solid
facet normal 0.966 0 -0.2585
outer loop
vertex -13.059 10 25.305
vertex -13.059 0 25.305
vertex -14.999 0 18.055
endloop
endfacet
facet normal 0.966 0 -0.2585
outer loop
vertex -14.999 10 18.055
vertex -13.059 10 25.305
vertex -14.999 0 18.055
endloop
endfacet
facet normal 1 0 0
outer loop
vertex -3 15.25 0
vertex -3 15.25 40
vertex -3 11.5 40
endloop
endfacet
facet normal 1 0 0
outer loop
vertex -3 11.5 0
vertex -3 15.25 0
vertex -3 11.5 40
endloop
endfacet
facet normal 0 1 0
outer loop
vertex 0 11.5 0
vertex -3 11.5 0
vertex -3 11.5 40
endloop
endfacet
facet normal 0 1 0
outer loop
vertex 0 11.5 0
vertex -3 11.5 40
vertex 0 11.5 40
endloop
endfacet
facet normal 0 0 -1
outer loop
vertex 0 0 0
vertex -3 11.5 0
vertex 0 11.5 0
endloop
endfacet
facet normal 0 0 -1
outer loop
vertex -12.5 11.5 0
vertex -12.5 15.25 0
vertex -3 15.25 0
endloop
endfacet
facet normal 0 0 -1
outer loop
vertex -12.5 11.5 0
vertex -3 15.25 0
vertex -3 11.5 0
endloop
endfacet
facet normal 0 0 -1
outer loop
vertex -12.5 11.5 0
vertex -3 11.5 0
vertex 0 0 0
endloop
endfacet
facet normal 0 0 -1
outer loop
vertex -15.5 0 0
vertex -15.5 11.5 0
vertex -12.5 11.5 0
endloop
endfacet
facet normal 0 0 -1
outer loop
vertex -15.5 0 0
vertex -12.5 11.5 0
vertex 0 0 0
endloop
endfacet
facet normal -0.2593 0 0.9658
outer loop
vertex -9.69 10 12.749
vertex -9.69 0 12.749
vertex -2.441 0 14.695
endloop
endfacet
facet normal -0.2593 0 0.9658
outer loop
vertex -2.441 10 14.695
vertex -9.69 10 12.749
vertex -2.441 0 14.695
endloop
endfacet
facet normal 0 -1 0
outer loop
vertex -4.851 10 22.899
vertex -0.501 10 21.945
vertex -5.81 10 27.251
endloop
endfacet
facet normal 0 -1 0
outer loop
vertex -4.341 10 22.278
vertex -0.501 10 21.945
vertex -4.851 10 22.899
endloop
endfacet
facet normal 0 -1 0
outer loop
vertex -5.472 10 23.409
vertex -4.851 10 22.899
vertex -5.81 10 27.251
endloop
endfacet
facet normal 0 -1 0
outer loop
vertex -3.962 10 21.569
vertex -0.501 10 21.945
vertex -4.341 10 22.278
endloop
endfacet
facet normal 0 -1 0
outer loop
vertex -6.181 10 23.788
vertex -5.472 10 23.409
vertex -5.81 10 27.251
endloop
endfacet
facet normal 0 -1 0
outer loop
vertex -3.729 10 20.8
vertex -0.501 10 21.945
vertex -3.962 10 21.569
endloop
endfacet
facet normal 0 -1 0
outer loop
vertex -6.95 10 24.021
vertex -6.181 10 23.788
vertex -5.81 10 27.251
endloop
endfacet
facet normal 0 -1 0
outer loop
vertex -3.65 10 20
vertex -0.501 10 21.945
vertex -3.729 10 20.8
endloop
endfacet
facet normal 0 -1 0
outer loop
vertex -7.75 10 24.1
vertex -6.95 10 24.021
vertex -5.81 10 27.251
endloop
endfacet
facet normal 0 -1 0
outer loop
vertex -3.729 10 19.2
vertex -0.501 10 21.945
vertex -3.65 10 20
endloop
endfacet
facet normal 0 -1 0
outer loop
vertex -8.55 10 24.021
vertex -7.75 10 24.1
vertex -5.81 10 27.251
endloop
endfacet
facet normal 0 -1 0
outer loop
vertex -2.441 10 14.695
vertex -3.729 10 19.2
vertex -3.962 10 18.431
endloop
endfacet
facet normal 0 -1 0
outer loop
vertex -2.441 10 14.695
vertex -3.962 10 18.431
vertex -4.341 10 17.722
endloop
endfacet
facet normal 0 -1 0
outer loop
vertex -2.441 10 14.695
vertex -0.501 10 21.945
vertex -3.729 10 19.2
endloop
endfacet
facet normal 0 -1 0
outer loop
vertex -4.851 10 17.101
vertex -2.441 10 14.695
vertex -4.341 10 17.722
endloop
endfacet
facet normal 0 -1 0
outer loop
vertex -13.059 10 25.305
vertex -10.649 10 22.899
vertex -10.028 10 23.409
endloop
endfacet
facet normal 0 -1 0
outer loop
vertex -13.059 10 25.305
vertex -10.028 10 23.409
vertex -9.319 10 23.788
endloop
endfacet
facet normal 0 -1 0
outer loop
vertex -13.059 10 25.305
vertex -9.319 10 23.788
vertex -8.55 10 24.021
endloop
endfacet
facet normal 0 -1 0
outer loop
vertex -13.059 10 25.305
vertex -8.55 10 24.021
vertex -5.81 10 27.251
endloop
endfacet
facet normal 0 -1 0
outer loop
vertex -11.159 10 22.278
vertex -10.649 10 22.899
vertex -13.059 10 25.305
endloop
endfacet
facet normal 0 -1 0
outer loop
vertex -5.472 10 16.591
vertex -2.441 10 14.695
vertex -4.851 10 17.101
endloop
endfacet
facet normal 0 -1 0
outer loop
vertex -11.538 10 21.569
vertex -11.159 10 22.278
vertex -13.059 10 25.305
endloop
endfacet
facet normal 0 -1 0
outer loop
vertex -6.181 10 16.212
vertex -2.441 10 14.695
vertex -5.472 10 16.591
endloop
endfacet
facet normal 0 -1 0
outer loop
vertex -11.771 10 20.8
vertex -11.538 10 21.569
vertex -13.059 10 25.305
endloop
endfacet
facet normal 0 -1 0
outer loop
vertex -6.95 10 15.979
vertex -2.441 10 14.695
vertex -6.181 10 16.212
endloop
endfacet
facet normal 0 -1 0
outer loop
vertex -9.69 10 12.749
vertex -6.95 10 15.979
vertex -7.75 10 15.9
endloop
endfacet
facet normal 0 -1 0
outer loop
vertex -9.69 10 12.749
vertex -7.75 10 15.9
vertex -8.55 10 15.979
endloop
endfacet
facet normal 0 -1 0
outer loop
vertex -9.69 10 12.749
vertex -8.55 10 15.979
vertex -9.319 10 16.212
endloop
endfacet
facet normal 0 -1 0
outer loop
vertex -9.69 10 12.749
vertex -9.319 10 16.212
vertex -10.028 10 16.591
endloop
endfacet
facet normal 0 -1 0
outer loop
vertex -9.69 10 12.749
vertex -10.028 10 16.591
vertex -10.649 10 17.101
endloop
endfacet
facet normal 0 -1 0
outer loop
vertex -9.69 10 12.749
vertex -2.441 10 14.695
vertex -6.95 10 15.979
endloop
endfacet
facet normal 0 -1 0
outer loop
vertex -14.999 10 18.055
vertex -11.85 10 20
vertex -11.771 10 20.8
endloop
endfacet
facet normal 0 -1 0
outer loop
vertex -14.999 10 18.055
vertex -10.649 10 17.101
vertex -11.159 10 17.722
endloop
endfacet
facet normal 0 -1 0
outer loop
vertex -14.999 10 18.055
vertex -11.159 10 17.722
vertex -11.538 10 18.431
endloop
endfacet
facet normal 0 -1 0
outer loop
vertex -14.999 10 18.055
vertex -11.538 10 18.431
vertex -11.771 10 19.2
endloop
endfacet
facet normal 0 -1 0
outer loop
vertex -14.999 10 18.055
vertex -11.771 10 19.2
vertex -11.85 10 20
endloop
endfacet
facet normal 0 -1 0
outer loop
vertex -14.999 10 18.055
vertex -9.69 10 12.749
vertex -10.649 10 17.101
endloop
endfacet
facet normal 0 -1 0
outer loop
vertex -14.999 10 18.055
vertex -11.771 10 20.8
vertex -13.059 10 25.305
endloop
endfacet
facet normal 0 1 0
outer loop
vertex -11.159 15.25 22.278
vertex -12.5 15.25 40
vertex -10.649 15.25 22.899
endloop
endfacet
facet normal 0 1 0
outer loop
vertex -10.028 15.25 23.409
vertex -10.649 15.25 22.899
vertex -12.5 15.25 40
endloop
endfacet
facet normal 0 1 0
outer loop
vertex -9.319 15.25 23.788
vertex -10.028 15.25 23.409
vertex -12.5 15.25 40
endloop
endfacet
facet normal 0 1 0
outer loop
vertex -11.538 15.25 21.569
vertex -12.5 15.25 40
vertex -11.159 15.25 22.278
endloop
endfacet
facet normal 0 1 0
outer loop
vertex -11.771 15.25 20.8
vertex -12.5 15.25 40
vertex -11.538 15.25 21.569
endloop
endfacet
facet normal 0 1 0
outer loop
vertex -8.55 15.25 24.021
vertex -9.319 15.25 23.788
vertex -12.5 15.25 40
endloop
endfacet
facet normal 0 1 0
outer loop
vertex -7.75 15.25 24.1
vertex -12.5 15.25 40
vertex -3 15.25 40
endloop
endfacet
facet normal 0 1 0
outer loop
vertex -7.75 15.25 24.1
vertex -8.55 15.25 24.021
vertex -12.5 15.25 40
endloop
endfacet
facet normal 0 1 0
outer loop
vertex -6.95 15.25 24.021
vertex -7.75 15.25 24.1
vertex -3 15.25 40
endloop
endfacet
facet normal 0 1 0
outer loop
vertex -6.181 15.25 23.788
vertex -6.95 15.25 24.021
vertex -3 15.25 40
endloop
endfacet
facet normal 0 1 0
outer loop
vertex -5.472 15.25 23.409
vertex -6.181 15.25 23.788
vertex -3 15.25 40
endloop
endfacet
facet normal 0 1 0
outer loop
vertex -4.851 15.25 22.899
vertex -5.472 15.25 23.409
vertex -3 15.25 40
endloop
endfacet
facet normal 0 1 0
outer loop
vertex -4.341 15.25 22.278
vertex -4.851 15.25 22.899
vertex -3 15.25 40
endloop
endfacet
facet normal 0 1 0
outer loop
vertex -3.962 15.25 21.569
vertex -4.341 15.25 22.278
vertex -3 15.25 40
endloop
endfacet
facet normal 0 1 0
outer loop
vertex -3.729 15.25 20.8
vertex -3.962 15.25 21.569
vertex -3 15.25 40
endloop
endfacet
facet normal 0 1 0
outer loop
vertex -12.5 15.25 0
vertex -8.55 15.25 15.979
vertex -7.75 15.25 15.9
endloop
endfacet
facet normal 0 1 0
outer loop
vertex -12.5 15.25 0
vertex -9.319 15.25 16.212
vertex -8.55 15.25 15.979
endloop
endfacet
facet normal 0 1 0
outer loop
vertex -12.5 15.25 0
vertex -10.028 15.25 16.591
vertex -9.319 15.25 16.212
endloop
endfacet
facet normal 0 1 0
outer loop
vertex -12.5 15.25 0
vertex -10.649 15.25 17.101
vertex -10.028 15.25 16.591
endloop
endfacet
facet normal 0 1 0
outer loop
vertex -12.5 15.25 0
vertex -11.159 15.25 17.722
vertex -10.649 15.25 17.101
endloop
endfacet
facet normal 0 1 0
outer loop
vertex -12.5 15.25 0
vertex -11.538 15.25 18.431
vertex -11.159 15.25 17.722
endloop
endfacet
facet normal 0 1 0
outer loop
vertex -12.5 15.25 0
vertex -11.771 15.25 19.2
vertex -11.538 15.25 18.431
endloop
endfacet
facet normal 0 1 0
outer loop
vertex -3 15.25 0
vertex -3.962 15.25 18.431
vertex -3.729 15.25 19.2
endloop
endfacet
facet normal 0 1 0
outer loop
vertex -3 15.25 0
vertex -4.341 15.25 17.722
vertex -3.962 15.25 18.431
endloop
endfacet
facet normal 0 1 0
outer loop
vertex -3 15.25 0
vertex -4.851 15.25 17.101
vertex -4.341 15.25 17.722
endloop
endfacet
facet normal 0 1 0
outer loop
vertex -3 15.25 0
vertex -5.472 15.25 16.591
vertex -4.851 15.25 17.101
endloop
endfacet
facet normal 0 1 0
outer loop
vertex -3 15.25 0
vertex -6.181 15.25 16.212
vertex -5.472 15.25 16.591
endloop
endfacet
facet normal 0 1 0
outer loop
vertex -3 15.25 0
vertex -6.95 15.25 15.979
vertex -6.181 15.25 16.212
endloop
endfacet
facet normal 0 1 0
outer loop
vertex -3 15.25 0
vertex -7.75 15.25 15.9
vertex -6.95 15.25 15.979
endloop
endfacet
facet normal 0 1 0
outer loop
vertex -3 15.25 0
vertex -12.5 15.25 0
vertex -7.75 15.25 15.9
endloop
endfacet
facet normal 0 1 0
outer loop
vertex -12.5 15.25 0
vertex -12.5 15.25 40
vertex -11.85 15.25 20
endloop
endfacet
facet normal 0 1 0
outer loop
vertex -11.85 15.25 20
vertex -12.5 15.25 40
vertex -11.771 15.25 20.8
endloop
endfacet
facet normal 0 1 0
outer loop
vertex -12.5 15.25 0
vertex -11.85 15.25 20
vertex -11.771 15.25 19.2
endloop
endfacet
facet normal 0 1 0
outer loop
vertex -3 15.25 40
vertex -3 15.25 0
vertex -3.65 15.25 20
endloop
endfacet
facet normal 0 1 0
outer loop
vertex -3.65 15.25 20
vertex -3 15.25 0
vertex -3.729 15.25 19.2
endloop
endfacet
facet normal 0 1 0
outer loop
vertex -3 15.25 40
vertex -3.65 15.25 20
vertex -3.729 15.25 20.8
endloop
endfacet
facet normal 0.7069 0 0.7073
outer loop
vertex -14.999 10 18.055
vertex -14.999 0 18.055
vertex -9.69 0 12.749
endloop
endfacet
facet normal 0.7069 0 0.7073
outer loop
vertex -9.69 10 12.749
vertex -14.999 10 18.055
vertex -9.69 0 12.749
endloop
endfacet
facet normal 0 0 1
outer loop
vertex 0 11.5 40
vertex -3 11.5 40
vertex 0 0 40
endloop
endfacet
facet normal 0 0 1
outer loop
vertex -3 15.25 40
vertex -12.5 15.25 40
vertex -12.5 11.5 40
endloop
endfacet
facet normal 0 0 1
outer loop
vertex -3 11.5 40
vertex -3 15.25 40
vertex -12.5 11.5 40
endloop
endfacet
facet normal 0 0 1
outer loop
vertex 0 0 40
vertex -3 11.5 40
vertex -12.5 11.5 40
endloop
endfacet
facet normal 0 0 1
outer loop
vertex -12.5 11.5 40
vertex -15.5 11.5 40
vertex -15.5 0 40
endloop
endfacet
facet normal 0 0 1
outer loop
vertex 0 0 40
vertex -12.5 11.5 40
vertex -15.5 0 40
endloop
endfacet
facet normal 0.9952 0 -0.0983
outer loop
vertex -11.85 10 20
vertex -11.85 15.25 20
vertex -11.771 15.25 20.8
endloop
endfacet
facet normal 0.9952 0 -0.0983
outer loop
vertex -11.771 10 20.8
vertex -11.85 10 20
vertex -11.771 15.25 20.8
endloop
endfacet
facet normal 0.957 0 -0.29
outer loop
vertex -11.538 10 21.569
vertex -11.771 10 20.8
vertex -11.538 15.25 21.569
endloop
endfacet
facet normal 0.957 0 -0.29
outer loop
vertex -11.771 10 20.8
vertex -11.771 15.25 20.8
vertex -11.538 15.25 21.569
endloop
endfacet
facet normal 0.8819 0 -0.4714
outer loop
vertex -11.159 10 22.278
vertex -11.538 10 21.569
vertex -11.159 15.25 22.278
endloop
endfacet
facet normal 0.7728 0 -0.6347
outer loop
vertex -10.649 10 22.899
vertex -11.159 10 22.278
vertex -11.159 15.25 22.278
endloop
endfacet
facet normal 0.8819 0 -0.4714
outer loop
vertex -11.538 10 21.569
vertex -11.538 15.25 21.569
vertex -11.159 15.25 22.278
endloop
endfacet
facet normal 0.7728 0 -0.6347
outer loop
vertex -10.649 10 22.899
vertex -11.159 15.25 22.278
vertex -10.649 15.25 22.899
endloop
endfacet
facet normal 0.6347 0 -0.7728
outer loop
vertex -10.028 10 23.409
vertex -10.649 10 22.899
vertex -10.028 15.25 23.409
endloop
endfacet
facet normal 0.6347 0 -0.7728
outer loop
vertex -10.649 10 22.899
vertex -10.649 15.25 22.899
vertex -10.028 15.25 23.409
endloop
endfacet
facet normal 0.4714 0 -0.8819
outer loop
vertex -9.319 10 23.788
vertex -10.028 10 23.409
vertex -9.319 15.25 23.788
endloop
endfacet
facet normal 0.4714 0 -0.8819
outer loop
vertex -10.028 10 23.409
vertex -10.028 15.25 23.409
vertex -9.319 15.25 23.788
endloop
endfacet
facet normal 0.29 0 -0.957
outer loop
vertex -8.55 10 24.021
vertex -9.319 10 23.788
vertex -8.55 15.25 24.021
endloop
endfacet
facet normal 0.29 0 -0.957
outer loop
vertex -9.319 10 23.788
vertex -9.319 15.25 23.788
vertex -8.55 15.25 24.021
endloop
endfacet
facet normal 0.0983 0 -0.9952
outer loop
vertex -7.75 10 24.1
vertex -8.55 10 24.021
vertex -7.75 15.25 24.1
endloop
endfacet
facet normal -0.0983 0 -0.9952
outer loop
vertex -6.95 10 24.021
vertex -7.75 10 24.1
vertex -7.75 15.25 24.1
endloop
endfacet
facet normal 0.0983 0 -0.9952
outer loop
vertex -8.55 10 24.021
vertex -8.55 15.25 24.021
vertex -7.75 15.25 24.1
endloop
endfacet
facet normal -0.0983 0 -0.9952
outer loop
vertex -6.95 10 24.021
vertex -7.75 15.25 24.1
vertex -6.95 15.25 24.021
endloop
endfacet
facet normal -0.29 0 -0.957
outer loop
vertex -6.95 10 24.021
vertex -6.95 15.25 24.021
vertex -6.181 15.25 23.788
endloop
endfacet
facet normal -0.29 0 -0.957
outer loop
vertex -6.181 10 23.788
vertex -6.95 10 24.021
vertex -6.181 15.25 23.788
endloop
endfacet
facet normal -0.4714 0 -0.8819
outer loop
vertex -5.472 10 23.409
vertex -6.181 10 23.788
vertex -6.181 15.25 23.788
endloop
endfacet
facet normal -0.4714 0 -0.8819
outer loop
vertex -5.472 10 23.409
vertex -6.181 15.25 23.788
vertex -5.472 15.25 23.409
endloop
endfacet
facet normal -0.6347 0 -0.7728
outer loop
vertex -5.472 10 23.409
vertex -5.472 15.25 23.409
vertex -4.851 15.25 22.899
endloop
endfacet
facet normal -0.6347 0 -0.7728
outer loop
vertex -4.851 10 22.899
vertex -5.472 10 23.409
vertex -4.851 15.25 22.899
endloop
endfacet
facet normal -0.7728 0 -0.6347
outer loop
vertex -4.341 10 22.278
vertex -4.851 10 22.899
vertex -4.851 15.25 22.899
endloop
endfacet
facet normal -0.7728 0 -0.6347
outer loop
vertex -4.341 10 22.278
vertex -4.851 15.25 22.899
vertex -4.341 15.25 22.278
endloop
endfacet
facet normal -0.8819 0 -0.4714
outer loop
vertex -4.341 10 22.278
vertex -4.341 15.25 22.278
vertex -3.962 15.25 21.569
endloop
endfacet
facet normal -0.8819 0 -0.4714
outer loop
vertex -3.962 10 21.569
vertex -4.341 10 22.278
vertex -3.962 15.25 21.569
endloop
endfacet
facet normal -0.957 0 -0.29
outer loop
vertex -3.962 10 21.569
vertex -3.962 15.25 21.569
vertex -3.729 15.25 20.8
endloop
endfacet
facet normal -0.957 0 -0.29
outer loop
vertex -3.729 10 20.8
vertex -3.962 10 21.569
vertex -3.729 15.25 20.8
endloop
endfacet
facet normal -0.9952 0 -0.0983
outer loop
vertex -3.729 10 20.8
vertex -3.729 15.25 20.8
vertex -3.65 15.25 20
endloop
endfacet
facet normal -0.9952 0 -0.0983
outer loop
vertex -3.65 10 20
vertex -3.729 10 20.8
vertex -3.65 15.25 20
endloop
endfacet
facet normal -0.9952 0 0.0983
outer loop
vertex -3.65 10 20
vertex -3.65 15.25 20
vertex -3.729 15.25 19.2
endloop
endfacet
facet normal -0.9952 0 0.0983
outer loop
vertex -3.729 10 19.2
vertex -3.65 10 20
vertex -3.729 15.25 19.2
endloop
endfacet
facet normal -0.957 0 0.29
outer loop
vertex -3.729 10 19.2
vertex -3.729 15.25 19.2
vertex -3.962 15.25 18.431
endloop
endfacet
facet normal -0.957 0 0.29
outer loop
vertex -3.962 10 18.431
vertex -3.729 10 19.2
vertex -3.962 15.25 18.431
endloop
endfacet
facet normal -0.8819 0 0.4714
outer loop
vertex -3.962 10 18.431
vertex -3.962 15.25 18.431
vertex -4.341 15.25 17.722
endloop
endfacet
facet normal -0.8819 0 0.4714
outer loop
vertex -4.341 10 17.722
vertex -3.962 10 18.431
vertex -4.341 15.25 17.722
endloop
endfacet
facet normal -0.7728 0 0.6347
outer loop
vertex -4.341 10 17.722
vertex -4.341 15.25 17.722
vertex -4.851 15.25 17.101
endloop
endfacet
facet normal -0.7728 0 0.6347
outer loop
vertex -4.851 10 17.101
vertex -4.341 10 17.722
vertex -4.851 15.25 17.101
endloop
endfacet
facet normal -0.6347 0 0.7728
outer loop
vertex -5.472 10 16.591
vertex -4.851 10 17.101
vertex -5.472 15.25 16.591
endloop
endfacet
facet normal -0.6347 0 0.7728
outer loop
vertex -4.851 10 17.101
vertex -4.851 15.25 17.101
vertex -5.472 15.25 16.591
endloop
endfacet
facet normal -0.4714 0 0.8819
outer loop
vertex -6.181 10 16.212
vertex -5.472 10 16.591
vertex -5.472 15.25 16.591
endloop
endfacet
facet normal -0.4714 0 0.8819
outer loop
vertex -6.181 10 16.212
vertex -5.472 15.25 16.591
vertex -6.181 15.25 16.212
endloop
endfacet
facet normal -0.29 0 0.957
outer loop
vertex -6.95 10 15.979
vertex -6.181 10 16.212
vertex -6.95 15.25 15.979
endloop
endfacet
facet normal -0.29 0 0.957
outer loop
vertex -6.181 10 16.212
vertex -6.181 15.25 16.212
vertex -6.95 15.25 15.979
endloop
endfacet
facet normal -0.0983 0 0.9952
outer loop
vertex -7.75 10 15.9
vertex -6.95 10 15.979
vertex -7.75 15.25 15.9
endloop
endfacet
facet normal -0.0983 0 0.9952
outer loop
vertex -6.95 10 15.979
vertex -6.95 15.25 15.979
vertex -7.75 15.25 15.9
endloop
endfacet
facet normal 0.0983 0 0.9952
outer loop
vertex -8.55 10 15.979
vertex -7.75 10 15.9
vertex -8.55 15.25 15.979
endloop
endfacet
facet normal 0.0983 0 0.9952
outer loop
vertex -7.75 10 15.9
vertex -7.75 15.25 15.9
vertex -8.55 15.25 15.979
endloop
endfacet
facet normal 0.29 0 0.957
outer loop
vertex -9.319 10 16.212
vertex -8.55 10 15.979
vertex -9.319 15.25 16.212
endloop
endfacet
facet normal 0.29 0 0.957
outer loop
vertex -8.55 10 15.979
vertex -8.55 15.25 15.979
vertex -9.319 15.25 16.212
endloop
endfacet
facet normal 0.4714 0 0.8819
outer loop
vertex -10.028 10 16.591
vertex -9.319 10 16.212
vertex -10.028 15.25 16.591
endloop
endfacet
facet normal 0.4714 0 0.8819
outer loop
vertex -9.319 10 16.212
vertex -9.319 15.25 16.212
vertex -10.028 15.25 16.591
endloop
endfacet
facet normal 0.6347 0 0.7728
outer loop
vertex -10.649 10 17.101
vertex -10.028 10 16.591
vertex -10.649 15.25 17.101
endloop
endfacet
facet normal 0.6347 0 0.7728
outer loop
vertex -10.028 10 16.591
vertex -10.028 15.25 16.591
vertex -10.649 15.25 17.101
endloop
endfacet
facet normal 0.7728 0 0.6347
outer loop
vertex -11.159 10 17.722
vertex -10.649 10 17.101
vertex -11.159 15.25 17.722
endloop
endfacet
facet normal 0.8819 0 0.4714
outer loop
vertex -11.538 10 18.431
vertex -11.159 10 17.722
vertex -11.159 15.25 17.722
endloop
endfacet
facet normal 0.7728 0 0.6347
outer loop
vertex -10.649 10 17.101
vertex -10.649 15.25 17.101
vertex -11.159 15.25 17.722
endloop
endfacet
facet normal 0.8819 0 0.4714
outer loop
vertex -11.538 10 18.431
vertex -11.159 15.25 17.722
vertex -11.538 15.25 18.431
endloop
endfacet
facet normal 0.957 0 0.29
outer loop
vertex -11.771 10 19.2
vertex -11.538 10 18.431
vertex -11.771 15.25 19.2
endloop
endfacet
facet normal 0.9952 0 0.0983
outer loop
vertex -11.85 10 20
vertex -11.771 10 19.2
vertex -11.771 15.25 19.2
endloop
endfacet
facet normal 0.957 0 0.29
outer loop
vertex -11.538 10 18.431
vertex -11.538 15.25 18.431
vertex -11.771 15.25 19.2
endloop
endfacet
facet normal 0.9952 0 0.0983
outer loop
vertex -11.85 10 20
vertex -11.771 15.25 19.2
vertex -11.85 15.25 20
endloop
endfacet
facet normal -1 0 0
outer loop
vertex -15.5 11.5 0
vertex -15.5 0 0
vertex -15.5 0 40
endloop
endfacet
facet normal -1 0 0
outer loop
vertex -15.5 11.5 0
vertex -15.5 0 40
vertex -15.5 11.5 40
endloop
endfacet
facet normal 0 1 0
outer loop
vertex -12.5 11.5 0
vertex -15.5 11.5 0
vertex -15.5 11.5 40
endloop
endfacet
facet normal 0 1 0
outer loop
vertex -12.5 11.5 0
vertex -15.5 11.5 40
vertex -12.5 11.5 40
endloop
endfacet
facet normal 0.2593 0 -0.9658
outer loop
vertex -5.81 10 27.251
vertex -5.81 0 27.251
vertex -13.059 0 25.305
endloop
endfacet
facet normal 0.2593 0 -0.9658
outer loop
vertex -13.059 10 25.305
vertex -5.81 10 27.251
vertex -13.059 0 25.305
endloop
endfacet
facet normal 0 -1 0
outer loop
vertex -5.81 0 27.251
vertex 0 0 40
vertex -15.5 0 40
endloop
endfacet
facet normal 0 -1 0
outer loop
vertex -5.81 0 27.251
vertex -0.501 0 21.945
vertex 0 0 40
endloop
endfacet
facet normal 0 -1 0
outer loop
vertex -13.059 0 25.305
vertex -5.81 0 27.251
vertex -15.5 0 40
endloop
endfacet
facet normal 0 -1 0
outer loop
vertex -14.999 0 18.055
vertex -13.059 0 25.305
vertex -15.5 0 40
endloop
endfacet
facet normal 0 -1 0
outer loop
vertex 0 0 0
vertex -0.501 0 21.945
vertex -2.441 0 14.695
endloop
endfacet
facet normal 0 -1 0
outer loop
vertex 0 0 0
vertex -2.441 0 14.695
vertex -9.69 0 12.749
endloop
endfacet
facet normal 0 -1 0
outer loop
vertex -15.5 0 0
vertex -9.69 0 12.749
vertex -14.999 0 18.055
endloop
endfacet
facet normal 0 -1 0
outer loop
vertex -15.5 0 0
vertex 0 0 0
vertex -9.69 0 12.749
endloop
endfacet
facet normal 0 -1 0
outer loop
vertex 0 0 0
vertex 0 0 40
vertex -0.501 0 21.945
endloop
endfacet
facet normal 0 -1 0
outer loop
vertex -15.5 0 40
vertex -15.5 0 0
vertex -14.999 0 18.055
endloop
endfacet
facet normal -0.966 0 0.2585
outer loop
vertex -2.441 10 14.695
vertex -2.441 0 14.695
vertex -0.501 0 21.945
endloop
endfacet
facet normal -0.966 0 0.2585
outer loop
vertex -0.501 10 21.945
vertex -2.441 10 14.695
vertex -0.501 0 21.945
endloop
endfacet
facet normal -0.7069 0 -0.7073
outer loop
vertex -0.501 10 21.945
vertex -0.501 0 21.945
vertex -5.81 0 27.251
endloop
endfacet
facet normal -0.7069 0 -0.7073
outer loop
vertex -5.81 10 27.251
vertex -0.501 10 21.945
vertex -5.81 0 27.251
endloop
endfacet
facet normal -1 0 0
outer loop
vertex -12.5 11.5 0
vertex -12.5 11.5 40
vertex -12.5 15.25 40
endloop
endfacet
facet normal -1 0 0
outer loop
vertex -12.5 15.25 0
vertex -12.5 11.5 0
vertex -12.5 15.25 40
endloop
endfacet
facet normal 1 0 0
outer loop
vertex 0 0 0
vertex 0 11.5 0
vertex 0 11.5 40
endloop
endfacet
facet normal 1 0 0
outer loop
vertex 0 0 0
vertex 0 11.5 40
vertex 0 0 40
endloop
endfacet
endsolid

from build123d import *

# Parameters (mm, degrees)
BOSS_EXTRUDE1_DEPTH = 40
CUT_EXTRUDE1_REACH  = 17.25
SKETCH2_R           = 4.1
CUT_EXTRUDE2_DEPTH  = 10


with BuildPart() as part:
    # Sketch1 → Boss-Extrude1 (new body)
    with BuildSketch(Plane(origin=(0, 0, 0), x_dir=(0, 1, 0), z_dir=(0, 0, 1))):
        Polygon((0, 0), (0, 15.5), (11.5, 15.5), (11.5, 12.5), (15.25, 12.5), (15.25, 3), (11.5, 3), (11.5, 0), align=None)
    extrude(amount=BOSS_EXTRUDE1_DEPTH)

    # Sketch2 → Cut-Extrude1 (cut, up to next)
    with BuildSketch(Plane(origin=(0, 15.25, 0), x_dir=(-1, 0, 0), z_dir=(0, 1, 0)), mode=Mode.PRIVATE) as cut_extrude1_sk1:
        with Locations((7.75, 20)):
            Circle(SKETCH2_R)
    cut_extrude1_tool1 = extrude(cut_extrude1_sk1.sketch, amount=-CUT_EXTRUDE1_REACH, mode=Mode.PRIVATE) & part.part
    add(cut_extrude1_tool1.solids().sort_by_distance((-7.75, 15.25, 20))[0], mode=Mode.SUBTRACT)

    # Sketch3 → Cut-Extrude2 (cut)
    with BuildSketch(Plane(origin=(0, 0, 0), x_dir=(-1, 0, 0), z_dir=(0, -1, 0))):
        Polygon((2.440808402, -14.694736773), (0.500911472, -21.945263183), (5.81010307, -27.250526411), (13.059191598, -25.305263227), (14.999088528, -18.054736817), (9.68989693, -12.749473589), align=None)
    extrude(amount=-CUT_EXTRUDE2_DEPTH, mode=Mode.SUBTRACT)


solid = part.part
